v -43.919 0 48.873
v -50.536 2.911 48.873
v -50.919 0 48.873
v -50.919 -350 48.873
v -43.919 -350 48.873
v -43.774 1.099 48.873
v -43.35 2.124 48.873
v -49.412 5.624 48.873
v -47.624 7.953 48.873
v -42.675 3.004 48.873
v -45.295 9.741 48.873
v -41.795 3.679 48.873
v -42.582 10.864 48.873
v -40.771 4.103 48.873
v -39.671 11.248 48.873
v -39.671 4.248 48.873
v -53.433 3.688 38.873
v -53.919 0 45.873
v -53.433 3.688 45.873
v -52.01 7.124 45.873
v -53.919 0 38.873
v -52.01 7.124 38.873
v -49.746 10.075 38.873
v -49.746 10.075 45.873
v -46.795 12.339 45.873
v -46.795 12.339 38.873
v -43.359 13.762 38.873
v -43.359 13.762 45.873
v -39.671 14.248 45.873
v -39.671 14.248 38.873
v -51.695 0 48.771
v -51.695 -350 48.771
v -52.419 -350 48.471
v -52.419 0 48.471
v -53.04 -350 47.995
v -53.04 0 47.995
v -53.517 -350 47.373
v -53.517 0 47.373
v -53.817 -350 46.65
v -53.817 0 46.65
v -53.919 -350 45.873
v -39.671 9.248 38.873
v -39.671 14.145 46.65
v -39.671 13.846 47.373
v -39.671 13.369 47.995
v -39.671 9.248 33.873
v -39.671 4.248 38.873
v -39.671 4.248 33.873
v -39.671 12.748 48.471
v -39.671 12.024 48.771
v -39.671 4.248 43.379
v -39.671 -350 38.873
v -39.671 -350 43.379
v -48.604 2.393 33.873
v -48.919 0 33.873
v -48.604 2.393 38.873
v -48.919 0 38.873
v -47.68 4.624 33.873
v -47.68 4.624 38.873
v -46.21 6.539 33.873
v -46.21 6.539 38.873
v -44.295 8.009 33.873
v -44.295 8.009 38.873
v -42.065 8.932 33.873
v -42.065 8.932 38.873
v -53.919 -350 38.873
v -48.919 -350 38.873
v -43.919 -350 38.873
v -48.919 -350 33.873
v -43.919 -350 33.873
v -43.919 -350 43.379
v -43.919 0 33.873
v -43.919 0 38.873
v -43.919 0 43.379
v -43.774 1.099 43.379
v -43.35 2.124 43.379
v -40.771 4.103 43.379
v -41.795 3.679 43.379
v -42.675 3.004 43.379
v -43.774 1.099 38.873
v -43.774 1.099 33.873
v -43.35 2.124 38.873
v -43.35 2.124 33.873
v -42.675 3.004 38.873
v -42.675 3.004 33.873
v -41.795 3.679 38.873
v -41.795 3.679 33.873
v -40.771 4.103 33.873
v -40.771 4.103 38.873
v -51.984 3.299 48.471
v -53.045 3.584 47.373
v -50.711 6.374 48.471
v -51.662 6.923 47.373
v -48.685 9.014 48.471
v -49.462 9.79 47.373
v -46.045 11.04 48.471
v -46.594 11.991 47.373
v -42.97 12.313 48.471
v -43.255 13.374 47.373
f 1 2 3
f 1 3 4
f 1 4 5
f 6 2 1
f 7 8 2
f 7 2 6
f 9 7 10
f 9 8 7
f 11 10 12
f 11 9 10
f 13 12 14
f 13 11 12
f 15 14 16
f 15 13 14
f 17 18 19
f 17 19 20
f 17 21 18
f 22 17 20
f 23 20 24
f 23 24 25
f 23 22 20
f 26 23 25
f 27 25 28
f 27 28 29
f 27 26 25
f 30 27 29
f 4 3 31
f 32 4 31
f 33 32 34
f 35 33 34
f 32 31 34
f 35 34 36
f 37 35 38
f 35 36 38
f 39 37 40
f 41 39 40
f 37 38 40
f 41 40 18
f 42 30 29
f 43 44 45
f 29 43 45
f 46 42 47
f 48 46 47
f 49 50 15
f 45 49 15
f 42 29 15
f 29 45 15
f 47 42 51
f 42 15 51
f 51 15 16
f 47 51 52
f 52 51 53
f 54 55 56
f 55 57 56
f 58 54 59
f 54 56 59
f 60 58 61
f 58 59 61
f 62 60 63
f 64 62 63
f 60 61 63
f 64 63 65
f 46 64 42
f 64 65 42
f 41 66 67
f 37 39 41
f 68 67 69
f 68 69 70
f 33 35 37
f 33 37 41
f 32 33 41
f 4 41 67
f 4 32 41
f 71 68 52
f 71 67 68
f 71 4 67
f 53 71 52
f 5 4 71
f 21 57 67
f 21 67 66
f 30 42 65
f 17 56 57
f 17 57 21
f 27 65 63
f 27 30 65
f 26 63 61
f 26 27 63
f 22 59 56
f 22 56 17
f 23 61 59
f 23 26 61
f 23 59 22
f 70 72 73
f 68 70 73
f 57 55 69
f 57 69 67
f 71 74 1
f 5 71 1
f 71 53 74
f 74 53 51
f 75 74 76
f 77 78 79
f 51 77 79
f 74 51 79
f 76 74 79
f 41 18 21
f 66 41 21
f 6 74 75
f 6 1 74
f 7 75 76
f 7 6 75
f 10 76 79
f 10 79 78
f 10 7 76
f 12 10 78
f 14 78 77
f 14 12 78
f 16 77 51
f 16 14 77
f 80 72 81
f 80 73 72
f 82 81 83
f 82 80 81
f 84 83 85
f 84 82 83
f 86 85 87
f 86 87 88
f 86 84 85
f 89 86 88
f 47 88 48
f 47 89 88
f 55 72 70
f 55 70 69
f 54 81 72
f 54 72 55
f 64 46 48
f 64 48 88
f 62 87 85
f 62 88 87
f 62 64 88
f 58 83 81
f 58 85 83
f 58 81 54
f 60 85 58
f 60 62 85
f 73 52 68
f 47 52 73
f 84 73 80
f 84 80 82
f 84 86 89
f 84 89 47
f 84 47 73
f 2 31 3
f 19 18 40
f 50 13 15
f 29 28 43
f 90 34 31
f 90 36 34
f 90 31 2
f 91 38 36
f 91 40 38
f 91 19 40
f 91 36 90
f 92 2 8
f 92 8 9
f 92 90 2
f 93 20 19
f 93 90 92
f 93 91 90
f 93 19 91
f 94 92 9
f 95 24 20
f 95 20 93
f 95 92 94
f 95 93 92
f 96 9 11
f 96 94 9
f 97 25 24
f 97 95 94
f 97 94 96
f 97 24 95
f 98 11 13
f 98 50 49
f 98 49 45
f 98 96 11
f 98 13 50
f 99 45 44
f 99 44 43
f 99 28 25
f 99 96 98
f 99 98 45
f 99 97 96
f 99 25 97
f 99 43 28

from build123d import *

# Parameters (mm, degrees)
F0_W     = 4.2475935817
F0_H     = 4.5055083651
F0_W_2   = 5
F0_H_2   = 5
F1_DEPTH = 350
F2_ANGLE = 90


with BuildPart() as f1:
    # F0 (on Front) → F1 (new body)
    with BuildSketch(Plane.XZ):
        with BuildLine():
            Line((-43.9187724888, 48.8732061069), (-50.9187724888, 48.8732061069))
            ThreePointArc((-50.9187724888, 48.8732061069), (-53.0400928324, 47.9945264505), (-53.9187724888, 45.8732061069))
            Line((-53.9187724888, 45.8732061069), (-53.9187724888, 38.8732061069))
            Line((-53.9187724888, 38.8732061069), (-48.9187724888, 38.8732061069))
            Line((-48.9187724888, 38.8732061069), (-43.9187724888, 38.8732061069))
            Line((-43.9187724888, 38.8732061069), (-43.9187724888, 43.3787144721))
            Line((-43.9187724888, 43.3787144721), (-43.9187724888, 48.8732061069))
        make_face()
        with Locations((-41.794975698, 41.1259602895)):
            Rectangle(F0_W, F0_H)
        with Locations((-46.4187724888, 36.3732061069)):
            Rectangle(F0_W_2, F0_H_2)
    extrude(amount=F1_DEPTH)

    # F0 (on Front) → F2 (revolve)
    with BuildSketch(Plane.XZ):
        with BuildLine():
            Line((-43.9187724888, 48.8732061069), (-50.9187724888, 48.8732061069))
            ThreePointArc((-50.9187724888, 48.8732061069), (-53.0400928324, 47.9945264505), (-53.9187724888, 45.8732061069))
            Line((-53.9187724888, 45.8732061069), (-53.9187724888, 38.8732061069))
            Line((-53.9187724888, 38.8732061069), (-48.9187724888, 38.8732061069))
            Line((-48.9187724888, 38.8732061069), (-43.9187724888, 38.8732061069))
            Line((-43.9187724888, 38.8732061069), (-43.9187724888, 43.3787144721))
            Line((-43.9187724888, 43.3787144721), (-43.9187724888, 48.8732061069))
        make_face()
        with Locations((-41.794975698, 41.1259602895)):
            Rectangle(F0_W, F0_H)
        with Locations((-46.4187724888, 36.3732061069)):
            Rectangle(F0_W_2, F0_H_2)
    revolve(axis=Axis((-39.6711789072, 0, 41.1259602895), (0, 0, -1)), revolution_arc=F2_ANGLE)


solid = f1.part
